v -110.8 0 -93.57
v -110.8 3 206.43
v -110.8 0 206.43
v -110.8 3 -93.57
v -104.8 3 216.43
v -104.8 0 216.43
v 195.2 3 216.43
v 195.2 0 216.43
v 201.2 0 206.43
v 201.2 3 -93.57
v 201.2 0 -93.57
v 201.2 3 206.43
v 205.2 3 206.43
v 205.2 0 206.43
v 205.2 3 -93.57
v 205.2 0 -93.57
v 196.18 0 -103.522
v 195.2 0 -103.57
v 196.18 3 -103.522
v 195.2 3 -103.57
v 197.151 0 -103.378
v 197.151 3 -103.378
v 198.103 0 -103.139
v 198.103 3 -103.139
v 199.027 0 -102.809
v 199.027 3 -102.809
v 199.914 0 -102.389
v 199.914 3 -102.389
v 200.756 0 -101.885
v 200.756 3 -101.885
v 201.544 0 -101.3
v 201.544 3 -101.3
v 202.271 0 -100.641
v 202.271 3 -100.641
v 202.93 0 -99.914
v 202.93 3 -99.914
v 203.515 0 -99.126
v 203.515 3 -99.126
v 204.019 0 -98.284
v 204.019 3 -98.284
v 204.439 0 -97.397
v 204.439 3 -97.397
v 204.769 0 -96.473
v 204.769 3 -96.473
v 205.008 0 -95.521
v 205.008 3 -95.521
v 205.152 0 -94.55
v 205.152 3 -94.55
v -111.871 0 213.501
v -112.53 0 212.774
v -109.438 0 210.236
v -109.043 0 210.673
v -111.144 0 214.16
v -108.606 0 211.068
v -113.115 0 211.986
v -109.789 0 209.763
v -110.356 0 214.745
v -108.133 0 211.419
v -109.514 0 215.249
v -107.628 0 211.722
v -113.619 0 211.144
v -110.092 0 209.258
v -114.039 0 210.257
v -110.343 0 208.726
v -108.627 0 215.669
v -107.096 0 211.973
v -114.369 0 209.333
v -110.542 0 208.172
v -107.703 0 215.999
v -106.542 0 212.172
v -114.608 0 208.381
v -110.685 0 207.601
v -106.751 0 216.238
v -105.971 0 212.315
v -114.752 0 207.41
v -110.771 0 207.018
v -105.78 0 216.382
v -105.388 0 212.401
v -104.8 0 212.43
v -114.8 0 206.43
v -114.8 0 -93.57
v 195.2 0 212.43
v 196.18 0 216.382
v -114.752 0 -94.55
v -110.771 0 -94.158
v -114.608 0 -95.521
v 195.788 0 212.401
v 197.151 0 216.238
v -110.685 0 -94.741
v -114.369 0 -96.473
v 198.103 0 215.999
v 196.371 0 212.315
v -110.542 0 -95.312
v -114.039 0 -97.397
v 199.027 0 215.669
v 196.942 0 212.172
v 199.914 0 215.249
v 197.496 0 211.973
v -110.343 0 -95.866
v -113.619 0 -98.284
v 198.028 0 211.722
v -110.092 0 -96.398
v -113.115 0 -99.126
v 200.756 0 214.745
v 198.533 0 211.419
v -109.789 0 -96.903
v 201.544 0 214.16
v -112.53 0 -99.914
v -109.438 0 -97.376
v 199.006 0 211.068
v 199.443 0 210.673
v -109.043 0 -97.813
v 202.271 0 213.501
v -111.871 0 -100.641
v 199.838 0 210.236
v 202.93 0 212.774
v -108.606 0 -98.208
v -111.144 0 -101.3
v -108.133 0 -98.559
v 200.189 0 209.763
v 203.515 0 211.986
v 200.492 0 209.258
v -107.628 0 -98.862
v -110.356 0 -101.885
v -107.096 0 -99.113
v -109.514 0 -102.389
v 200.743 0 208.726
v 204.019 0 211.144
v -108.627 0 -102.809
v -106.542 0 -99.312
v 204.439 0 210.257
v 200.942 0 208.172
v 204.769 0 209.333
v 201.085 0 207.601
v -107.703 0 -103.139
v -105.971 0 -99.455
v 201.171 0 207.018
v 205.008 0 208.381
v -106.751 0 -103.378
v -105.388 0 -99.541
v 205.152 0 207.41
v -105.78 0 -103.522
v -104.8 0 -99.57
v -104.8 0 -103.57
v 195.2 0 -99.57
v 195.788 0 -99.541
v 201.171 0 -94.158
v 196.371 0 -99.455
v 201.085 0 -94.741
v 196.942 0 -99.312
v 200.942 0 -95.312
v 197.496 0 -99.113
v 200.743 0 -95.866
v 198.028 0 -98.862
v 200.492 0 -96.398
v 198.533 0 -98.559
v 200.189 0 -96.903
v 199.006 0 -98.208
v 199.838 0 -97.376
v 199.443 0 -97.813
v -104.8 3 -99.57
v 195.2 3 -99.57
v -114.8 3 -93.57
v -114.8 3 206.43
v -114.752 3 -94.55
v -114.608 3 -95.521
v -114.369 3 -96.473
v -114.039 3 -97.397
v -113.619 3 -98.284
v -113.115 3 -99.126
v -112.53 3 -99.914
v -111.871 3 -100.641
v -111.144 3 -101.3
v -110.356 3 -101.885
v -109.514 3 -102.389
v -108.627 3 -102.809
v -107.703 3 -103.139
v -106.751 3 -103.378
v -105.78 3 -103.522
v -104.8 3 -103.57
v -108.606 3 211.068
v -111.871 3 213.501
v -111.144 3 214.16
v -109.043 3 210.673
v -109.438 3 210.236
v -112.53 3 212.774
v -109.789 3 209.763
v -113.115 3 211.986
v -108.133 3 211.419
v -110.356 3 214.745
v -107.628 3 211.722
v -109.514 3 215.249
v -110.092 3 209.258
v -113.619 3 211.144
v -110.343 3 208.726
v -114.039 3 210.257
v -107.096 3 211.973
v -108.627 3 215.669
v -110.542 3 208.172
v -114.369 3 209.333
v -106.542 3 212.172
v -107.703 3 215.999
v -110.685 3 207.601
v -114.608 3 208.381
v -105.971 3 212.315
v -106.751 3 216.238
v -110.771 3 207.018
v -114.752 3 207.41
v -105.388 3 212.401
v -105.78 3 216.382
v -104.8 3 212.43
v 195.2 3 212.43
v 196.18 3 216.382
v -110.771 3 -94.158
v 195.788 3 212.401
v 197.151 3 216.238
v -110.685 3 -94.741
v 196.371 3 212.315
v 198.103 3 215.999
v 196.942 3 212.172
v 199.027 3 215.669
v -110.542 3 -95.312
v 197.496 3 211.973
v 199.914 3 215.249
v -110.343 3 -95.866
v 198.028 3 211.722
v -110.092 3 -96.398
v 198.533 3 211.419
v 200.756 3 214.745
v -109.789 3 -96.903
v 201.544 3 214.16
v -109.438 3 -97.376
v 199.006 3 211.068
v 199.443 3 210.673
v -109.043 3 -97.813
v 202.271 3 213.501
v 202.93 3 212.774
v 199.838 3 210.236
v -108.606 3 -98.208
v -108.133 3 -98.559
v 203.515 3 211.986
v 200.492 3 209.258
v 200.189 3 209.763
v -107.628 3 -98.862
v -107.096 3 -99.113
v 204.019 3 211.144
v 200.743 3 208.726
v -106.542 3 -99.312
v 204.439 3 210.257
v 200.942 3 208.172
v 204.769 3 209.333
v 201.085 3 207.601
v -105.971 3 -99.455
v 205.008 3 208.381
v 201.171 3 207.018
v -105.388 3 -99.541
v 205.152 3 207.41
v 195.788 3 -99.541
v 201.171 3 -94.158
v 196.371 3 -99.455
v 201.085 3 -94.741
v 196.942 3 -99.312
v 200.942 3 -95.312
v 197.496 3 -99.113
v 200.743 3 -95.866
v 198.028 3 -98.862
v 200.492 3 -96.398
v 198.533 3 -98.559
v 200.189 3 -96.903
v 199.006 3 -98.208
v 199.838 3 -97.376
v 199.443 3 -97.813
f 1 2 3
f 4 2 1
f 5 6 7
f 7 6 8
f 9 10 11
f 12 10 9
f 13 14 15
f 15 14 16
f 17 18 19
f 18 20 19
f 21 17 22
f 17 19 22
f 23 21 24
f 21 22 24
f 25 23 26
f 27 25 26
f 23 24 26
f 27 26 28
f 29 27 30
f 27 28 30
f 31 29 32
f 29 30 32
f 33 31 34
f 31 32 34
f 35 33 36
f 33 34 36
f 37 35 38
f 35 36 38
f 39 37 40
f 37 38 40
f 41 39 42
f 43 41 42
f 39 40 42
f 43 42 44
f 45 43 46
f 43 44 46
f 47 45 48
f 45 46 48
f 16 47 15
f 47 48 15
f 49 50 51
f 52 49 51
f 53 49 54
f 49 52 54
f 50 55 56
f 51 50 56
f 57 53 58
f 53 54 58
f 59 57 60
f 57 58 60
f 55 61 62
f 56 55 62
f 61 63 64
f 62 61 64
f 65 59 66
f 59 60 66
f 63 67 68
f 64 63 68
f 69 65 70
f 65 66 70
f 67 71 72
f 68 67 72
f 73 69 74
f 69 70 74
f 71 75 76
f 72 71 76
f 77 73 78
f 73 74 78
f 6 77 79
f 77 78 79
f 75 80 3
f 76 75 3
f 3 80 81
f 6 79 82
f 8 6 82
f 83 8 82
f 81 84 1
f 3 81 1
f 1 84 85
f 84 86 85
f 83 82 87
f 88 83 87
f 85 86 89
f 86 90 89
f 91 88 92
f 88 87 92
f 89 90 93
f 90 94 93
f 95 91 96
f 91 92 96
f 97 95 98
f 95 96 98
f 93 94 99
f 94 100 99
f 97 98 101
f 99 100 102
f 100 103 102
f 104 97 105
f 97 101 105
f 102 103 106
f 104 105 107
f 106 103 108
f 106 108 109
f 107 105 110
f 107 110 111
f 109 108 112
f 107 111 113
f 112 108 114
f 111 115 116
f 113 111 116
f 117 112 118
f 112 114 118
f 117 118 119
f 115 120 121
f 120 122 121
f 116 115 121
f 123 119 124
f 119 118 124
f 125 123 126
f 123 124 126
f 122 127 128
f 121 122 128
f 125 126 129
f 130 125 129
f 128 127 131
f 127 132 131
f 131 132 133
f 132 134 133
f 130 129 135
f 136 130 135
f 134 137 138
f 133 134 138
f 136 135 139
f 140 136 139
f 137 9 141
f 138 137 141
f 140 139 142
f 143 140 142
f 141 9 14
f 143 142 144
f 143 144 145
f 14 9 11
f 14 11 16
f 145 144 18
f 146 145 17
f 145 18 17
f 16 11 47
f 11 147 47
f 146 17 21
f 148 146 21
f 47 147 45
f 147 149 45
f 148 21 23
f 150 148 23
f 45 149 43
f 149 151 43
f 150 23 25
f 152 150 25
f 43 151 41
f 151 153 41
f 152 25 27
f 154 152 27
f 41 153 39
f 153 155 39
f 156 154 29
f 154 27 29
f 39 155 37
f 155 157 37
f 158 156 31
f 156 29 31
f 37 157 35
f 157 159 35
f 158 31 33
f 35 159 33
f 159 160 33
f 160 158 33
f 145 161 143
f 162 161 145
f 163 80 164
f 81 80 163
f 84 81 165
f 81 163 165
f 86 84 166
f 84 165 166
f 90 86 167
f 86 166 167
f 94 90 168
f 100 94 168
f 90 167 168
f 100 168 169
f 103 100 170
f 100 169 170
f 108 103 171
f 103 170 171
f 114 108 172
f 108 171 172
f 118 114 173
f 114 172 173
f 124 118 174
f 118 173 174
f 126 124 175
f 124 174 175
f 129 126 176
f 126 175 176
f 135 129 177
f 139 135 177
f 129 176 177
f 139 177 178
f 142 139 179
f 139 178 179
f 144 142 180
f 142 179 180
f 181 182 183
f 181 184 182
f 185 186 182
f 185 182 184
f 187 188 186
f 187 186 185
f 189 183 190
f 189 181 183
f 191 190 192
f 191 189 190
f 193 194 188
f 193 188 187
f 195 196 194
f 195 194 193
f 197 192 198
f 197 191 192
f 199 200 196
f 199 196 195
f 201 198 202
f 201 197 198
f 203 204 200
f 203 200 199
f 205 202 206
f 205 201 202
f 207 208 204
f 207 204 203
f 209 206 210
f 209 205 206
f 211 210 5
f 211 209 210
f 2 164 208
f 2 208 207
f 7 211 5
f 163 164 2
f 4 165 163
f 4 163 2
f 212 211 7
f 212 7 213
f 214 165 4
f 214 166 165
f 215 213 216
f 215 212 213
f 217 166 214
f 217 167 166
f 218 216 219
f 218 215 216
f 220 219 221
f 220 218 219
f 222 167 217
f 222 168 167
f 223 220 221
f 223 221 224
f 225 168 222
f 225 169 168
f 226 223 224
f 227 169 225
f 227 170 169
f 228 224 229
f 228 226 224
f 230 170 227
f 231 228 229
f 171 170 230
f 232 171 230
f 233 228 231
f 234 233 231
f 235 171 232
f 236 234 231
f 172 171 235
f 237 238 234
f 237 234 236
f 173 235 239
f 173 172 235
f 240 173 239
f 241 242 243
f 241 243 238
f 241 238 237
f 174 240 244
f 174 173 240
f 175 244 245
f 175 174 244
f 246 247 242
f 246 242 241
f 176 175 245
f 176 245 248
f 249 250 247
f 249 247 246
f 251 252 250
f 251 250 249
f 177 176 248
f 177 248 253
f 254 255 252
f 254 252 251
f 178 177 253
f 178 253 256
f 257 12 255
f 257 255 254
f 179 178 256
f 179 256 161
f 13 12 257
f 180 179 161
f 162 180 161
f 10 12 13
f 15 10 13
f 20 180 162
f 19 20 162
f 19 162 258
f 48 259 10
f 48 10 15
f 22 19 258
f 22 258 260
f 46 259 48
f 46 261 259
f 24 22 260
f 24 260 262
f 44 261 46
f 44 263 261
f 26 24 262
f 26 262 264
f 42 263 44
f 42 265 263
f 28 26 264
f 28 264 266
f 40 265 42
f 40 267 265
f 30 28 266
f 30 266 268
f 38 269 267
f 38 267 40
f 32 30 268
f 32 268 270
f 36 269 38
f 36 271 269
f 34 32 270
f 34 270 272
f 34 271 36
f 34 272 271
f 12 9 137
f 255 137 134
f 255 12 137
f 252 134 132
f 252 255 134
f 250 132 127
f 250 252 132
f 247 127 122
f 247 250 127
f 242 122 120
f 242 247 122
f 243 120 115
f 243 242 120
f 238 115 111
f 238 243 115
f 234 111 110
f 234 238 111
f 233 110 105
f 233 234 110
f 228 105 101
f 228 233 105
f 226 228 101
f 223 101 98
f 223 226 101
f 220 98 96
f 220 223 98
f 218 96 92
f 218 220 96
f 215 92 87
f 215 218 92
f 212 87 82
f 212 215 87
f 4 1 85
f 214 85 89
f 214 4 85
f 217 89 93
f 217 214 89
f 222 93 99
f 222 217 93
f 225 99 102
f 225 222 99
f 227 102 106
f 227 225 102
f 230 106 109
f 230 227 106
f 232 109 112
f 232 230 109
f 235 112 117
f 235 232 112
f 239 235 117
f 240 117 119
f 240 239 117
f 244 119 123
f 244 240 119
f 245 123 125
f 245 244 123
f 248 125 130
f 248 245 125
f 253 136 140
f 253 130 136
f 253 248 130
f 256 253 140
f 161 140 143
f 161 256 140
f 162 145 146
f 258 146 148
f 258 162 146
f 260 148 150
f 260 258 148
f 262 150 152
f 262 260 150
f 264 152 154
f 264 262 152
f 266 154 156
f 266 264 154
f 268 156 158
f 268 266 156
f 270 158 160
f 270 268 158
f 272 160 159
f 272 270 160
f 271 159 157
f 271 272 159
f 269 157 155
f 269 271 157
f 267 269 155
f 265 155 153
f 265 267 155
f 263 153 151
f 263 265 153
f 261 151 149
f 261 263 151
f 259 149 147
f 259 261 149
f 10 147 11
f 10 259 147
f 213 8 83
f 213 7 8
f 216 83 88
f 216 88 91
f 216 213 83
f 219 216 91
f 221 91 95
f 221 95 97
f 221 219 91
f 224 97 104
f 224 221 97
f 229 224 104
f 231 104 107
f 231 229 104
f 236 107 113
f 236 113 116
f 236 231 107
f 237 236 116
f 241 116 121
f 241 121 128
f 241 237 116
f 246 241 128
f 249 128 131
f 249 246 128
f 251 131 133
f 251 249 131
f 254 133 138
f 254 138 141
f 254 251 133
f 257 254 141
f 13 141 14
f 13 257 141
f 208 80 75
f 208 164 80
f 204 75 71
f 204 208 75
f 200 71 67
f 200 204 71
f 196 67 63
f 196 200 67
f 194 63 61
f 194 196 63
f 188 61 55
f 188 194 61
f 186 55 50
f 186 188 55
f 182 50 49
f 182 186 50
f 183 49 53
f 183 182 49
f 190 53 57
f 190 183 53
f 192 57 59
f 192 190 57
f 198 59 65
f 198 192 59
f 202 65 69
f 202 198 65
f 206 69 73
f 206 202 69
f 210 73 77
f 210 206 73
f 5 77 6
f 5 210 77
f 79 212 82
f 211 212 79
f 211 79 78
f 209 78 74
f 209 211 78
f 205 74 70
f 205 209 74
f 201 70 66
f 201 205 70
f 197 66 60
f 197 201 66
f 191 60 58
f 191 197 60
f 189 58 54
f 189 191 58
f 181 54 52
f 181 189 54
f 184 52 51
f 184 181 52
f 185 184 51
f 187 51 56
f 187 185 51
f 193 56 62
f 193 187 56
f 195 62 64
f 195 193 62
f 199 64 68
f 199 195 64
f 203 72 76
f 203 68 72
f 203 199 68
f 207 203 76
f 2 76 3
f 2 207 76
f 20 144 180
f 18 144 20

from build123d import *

# Parameters (mm, degrees)
SKETCH1_W           = 320
SKETCH1_H           = 320
SKETCH1_R           = 2.25
SKETCH1_R_2         = 15
SKETCH1_W_2         = 248
SKETCH1_H_2         = 112
BOSS_EXTRUDE1_DEPTH = 3
FILLET1_R           = 10
SKETCH2_R           = 2.25
SKETCH2_R_2         = 15
SKETCH2_W           = 248
SKETCH2_H           = 112
CUT_EXTRUDE1_DEPTH  = 10


with BuildPart() as part:
    # Sketch1 → Boss-Extrude1 (new body)
    with BuildSketch(Plane(origin=(0, 0, 0), x_dir=(1, 0, 0), z_dir=(0, 1, 0))):
        with Locations((45.2, -56.43)):
            Rectangle(SKETCH1_W, SKETCH1_H)
        with Locations((-36.05, -70.43)):
            Circle(SKETCH1_R, mode=Mode.SUBTRACT)
        with Locations((126.45, -70.43)):
            Circle(SKETCH1_R, mode=Mode.SUBTRACT)
        with Locations((128.7, -200.43)):
            Circle(SKETCH1_R, mode=Mode.SUBTRACT)
        with Locations((-33.8, -200.43)):
            Circle(SKETCH1_R, mode=Mode.SUBTRACT)
        with Locations((45.2, -135.43)):
            Circle(SKETCH1_R_2, mode=Mode.SUBTRACT)
        with Locations((45.2, 41.57)):
            Rectangle(SKETCH1_W_2, SKETCH1_H_2, mode=Mode.SUBTRACT)
    extrude(amount=BOSS_EXTRUDE1_DEPTH)

    # Fillet1
    fillet1_edges = [part.edges().sort_by_distance(p)[0] for p in [
        (205.2, 1.5, 216.43),
        (-114.8, 1.5, 216.43),
        (-114.8, 1.5, -103.57),
        (205.2, 1.5, -103.57),
    ]]
    fillet(fillet1_edges, radius=FILLET1_R)

    # Sketch2 → Cut-Extrude1 (cut)
    with BuildSketch(Plane(origin=(0, 3, 0), x_dir=(1, 0, 0), z_dir=(0, 1, 0))):
        with BuildLine():
            Line((-104.8, 99.57), (195.2, 99.57))
            ThreePointArc((195.2, 99.57), (199.442640687, 97.812640687), (201.2, 93.57))
            Line((201.2, 93.57), (201.2, -206.43))
            ThreePointArc((201.2, -206.43), (199.442640687, -210.672640687), (195.2, -212.43))
            Line((195.2, -212.43), (-104.8, -212.43))
            ThreePointArc((-104.8, -212.43), (-109.042640687, -210.672640687), (-110.8, -206.43))
            Line((-110.8, -206.43), (-110.8, 93.57))
            ThreePointArc((-110.8, 93.57), (-109.042640687, 97.812640687), (-104.8, 99.57))
        make_face()
        with Locations((-33.8, -200.43)):
            Circle(SKETCH2_R, mode=Mode.SUBTRACT)
        with Locations((126.45, -70.43)):
            Circle(SKETCH2_R, mode=Mode.SUBTRACT)
        with Locations((-36.05, -70.43)):
            Circle(SKETCH2_R, mode=Mode.SUBTRACT)
        with Locations((128.7, -200.43)):
            Circle(SKETCH2_R, mode=Mode.SUBTRACT)
        with Locations((45.2, -135.43)):
            Circle(SKETCH2_R_2, mode=Mode.SUBTRACT)
        with Locations((45.2, 41.57)):
            Rectangle(SKETCH2_W, SKETCH2_H, mode=Mode.SUBTRACT)
    extrude(amount=-CUT_EXTRUDE1_DEPTH, mode=Mode.SUBTRACT)


solid = part.part
